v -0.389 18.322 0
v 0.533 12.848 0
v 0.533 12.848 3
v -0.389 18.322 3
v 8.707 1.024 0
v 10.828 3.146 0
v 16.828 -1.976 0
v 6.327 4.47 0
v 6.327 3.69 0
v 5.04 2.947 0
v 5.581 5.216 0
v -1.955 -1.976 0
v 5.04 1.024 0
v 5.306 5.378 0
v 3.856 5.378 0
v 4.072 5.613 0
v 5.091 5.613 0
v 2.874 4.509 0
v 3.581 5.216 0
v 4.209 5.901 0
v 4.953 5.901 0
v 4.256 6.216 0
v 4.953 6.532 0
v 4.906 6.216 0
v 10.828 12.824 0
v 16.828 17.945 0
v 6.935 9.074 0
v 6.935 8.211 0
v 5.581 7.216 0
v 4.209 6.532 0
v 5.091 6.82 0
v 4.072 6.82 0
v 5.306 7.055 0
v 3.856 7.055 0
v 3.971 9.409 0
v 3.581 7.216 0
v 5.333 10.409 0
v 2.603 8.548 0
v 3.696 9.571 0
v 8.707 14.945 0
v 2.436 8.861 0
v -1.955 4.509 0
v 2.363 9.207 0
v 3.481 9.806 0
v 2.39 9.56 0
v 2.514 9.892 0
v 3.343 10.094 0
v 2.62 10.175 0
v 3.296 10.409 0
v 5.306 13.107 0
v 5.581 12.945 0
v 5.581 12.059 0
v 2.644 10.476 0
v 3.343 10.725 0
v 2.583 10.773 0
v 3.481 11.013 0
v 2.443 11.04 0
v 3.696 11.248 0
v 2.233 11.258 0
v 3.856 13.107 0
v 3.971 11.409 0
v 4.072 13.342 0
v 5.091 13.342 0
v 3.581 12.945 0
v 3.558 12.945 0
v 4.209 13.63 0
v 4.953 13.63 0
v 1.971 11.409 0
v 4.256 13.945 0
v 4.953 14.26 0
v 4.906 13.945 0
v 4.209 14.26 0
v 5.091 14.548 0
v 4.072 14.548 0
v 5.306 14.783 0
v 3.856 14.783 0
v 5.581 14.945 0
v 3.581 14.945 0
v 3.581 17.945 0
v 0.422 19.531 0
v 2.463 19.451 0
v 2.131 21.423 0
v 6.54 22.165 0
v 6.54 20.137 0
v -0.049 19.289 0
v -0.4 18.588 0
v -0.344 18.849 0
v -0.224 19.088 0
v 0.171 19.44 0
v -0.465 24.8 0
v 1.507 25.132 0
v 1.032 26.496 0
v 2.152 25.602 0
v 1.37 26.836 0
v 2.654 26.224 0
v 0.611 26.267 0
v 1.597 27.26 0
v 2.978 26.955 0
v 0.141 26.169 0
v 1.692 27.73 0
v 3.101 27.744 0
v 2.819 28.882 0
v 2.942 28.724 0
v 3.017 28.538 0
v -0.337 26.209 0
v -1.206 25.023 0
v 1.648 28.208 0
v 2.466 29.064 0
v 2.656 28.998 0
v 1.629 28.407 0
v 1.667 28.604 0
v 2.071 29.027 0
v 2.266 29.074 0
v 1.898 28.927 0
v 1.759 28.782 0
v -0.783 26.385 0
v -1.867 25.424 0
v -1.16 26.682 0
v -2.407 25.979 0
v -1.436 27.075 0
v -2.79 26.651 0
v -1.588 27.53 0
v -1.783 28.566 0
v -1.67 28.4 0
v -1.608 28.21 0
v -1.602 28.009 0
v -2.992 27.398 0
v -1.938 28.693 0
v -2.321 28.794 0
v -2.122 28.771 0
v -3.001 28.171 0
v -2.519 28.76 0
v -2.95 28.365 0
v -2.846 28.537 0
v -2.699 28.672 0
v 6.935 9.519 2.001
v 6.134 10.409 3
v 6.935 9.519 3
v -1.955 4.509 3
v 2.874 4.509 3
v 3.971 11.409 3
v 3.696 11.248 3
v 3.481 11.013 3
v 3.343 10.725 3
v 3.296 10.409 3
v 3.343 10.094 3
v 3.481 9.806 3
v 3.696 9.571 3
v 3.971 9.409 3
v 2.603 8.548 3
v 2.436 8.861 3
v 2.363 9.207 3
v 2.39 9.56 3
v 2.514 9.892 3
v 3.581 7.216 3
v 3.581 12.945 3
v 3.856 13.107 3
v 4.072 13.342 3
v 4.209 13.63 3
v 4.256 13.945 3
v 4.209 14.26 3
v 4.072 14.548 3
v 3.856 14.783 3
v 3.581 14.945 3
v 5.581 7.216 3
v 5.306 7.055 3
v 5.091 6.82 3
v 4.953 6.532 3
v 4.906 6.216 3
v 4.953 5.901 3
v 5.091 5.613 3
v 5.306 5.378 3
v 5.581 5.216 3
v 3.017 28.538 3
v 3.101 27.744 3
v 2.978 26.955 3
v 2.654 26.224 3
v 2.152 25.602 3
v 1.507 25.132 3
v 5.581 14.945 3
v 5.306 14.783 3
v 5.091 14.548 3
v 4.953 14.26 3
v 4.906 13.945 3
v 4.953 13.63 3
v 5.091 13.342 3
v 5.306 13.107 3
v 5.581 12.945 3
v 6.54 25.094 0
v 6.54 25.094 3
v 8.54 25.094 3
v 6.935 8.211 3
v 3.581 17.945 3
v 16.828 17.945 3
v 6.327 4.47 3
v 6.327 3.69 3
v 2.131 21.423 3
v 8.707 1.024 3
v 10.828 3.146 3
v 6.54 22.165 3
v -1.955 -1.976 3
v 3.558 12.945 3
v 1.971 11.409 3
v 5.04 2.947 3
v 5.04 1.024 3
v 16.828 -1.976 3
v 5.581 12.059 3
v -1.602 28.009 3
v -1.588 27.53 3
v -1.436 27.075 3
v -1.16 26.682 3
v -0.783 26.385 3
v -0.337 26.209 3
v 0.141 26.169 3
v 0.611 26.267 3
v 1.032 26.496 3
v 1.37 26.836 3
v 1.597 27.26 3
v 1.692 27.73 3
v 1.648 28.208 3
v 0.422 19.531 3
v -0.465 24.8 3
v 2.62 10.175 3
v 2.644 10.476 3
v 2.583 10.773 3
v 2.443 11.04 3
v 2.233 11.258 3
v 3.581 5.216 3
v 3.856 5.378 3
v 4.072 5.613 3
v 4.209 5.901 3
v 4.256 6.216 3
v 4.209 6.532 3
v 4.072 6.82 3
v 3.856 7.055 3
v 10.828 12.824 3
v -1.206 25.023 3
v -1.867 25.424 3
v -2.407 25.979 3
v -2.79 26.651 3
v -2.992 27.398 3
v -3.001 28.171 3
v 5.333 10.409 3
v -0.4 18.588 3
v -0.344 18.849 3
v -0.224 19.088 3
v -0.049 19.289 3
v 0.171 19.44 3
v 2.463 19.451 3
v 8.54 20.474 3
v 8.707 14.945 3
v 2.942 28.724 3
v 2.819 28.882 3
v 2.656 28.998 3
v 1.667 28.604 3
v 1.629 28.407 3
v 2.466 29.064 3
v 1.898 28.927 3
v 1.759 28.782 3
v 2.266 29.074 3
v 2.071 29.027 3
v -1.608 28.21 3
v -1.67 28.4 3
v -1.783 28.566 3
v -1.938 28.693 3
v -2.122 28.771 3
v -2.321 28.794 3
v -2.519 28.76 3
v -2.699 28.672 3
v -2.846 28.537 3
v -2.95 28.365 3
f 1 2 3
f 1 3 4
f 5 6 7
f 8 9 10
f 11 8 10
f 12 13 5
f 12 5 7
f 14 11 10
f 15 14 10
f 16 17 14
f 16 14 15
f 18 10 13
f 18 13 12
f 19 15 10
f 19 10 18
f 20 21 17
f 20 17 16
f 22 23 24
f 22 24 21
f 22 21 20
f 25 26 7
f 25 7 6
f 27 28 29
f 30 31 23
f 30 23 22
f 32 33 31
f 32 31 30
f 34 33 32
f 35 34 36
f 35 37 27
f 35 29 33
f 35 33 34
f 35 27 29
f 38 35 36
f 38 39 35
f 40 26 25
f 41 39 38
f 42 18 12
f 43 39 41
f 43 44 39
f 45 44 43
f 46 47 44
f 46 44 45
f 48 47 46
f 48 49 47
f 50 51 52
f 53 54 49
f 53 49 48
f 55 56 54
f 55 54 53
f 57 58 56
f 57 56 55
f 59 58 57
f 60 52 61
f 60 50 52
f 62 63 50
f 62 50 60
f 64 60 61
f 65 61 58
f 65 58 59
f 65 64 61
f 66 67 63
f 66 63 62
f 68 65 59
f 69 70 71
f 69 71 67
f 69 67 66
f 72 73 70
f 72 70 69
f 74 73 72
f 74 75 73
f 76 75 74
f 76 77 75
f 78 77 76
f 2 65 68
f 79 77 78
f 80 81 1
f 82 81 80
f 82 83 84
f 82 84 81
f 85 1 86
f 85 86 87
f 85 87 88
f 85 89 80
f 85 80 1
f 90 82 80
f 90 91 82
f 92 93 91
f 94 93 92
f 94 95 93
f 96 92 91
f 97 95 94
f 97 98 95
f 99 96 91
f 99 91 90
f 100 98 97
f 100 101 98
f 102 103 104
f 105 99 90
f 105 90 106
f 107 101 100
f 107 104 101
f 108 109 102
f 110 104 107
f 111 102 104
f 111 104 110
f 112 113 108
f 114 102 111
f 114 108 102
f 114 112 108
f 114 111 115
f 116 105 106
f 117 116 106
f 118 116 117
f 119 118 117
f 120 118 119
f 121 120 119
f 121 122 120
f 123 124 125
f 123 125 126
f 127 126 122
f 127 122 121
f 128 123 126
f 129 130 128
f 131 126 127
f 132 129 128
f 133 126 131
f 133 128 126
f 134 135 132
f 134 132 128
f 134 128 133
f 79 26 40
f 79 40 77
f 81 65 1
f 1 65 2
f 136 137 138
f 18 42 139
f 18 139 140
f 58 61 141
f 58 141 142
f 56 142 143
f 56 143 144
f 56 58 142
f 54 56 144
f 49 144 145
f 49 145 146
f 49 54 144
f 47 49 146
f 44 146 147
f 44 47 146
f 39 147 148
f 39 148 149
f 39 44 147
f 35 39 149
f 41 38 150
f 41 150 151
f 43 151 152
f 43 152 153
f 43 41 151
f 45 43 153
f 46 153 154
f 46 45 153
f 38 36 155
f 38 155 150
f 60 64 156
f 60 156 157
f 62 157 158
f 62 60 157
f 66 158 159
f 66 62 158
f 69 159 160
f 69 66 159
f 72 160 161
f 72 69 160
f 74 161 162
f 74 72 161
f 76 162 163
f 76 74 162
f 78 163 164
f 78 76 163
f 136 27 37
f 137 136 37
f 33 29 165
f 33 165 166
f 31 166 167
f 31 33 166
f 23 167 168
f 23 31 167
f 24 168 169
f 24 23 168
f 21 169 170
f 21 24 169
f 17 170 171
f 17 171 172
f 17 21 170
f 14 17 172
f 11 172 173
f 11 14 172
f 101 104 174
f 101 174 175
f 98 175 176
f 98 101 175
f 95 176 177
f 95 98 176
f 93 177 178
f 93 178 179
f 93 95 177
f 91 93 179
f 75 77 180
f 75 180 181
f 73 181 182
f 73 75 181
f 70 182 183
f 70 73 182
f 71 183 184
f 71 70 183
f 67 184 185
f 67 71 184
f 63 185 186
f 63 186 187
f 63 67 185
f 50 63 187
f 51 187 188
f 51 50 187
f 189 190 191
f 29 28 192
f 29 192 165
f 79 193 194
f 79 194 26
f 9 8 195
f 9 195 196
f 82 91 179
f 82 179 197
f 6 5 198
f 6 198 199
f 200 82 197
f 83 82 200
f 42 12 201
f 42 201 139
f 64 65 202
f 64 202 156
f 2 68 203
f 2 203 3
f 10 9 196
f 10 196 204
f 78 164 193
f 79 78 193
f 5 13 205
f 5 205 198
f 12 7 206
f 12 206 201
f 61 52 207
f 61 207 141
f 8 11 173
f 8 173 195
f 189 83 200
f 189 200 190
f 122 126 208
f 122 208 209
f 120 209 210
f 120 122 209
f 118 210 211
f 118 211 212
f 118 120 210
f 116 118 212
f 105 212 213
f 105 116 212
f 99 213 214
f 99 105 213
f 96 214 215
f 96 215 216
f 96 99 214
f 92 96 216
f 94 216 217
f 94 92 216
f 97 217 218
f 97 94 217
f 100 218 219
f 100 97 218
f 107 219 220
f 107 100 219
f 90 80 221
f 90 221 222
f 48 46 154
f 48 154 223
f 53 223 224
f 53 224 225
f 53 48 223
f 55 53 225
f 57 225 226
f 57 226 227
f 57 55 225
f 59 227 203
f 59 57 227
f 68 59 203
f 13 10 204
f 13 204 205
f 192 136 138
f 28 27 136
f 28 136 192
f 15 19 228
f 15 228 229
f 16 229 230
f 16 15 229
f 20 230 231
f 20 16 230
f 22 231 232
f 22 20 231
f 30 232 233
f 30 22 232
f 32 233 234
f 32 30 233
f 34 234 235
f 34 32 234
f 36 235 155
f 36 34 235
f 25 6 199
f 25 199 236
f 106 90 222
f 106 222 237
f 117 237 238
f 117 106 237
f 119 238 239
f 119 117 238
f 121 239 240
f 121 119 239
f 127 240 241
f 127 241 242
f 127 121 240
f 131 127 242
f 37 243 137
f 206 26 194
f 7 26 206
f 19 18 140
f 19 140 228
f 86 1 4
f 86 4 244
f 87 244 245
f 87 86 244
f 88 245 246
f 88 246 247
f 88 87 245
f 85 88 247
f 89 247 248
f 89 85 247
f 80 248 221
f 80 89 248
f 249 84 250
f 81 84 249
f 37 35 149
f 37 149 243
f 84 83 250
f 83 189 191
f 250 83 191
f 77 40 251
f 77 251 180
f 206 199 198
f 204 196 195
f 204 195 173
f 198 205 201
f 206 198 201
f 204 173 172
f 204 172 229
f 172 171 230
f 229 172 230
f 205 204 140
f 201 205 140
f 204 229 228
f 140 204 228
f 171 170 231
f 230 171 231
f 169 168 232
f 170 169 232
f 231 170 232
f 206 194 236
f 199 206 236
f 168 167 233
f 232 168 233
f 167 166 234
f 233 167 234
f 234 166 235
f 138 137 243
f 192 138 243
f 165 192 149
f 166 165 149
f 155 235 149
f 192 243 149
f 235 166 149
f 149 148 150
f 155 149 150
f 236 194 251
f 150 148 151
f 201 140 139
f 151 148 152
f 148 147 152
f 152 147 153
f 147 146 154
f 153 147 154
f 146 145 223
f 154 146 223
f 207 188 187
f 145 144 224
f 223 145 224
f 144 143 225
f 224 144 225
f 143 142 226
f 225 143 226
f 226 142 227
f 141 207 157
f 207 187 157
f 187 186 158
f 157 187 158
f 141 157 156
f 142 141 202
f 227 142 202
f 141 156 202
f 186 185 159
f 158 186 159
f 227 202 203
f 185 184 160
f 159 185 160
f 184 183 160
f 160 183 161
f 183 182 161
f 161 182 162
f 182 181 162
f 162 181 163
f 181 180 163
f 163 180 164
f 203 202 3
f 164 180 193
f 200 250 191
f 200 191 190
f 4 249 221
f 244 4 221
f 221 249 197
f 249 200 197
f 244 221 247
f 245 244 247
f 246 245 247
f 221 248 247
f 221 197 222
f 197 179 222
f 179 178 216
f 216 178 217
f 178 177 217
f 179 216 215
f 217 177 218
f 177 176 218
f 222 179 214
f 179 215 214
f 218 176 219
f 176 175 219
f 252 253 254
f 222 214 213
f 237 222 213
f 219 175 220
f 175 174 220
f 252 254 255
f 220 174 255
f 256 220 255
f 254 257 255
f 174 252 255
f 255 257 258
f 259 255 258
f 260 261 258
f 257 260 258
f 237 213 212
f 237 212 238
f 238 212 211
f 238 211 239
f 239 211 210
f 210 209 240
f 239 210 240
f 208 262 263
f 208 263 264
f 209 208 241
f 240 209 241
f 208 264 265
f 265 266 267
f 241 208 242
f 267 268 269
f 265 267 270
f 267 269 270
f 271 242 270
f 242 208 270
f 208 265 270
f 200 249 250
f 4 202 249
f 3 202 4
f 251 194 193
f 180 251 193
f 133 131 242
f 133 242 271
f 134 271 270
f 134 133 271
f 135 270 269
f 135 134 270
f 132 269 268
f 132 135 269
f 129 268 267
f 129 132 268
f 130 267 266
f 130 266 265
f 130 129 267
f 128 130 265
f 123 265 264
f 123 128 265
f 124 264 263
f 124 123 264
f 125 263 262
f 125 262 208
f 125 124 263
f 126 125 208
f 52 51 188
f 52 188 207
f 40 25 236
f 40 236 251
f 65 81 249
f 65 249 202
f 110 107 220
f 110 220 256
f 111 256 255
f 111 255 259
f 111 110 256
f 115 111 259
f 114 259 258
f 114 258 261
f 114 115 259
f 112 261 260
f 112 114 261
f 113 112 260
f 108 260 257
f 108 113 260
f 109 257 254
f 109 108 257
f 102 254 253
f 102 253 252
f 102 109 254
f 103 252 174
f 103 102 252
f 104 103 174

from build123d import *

# Parameters (mm, degrees)
BOSS_SWITCHMAIN_DEPTH           = 3
SKETCH1_W                       = 6.582729781
SKETCH1_H                       = 1.5
SKETCH1_W_2                     = 4.49100728
BOSS_FLANGE_WIDTH_DEPTH         = 6
SKETCH2_W                       = 5
SKETCH2_H                       = 1.490135464
SKETCH2_H_2                     = 1.5
SKETCH2_H_3                     = 2.286069733
BOSS_FLANGE_HEIGHT_DEPTH        = 11.6675
TAP_DRILL_FOR_M2X0_4_TAP1_D     = 1.6
M2_CLEARANCE_HOLE2_D            = 2.4
M2_CLEARANCE_HOLE2_DEPTH        = 6.484923868
M2_CLEARANCE_HOLE2_TIP          = 0.721032743
CUT_FLANGE_RAMP_CLEARANCE_REACH = 21.921
SKETCH10_W                      = 1.51157113
SKETCH10_H                      = 3
CUT_EXTRUDE1_REACH              = 29.069
CUT_EXTRUDE2_REACH              = 24.401
SKETCH14_W                      = 3.00210875
SKETCH14_H                      = 3.681985306
SKETCH15_W                      = 18.424052467
SKETCH15_H                      = 20.375612782
CUT_EXTRUDE3_DEPTH              = 7


with BuildPart() as part:
    # Sketch-SwitchBossUp → Boss-SwitchMain (new body)
    with BuildSketch(Plane.XY):
        with BuildLine():
            Line((6.540476927, 22.165014537), (6.540476927, 25.093856925))
            Line((6.540476927, 25.093856925), (8.540476927, 25.093856925))
            Line((8.540476927, 25.093856925), (8.540476927, 20.473554675))
            Line((8.540476927, 20.473554675), (2.463355023, 19.450530066))
            Line((2.463355023, 19.450530066), (3.558499615, 12.944990388))
            Line((3.558499615, 12.944990388), (3.581088316, 12.944953207))
            ThreePointArc((3.581088316, 12.944953207), (4.256080915, 13.944958203), (3.581073513, 14.944953207))
            Line((3.581073513, 14.944953207), (3.581073513, 17.94496801))
            Line((3.581073513, 17.94496801), (6.811292922, 17.94496801))
            Line((6.811292922, 17.94496801), (16.828083018, 17.94496801))
            Line((16.828083018, 17.94496801), (16.828083018, -1.975613284))
            Line((16.828083018, -1.975613284), (5.040476927, -1.975613284))
            Line((5.040476927, -1.975613284), (-1.954752854, -1.975613284))
            Line((-1.954752854, -1.975613284), (-1.954752854, 4.509310584))
            Line((-1.954752854, 4.509310584), (2.874043973, 4.509310584))
            Line((2.874043973, 4.509310584), (3.58114552, 5.216422599))
            ThreePointArc((3.58114552, 5.216422599), (4.256138119, 6.216427595), (3.581130717, 7.216422599))
            Line((3.581130717, 7.216422599), (2.603418204, 8.548280984))
            ThreePointArc((2.603418204, 8.548280984), (2.363042898, 9.20714873), (2.514052348, 9.892045174))
            ThreePointArc((2.514052348, 9.892045174), (2.58326881, 10.772563057), (1.97126394, 11.409393254))
            Line((1.97126394, 11.409393254), (0.5326123, 12.848023597))
            Line((0.5326123, 12.848023597), (-0.388805291, 18.321564484))
            ThreePointArc((-0.388805291, 18.321564484), (-0.224136417, 19.087558912), (0.421628056, 19.531238467))
            Line((0.421628056, 19.531238467), (-0.465233701, 24.799505683))
            ThreePointArc((-0.465233701, 24.799505683), (-2.406587703, 25.978955839), (-3.001107523, 28.171329943))
            ThreePointArc((-3.001107523, 28.171329943), (-2.220760115, 28.789797628), (-1.602292431, 28.009450221))
            ThreePointArc((-1.602292431, 28.009450221), (0.141134159, 26.168671513), (1.647974165, 28.207650602))
            ThreePointArc((1.647974165, 28.207650602), (2.167041147, 29.057364566), (3.016755111, 28.538297585))
            ThreePointArc((3.016755111, 28.538297585), (2.839798095, 26.578800421), (1.507016259, 25.131514861))
            Line((1.507016259, 25.131514861), (2.131345845, 21.422780026))
            Line((2.131345845, 21.422780026), (6.540476927, 22.165014537))
        make_face()
        with BuildLine():
            Line((5.581088316, 12.94496801), (5.581094877, 12.05857133))
            Line((5.581094877, 12.05857133), (3.97126394, 11.409408058))
            ThreePointArc((3.97126394, 11.409408058), (3.296271341, 10.409403061), (3.971278743, 9.409408058))
            Line((3.971278743, 9.409408058), (5.332971639, 10.409021979))
            Line((5.332971639, 10.409021979), (6.133921896, 10.409027907))
            Line((6.133921896, 10.409027907), (6.935397893, 9.518898634))
            Line((6.935397893, 9.518898634), (6.935397893, 8.210600129))
            Line((6.935397893, 8.210600129), (5.581130717, 7.216437402))
            ThreePointArc((5.581130717, 7.216437402), (4.906138119, 6.216432406), (5.58114552, 5.216437402))
            Line((5.58114552, 5.216437402), (6.327120808, 4.470473157))
            Line((6.327120808, 4.470473157), (6.327120808, 3.690267188))
            Line((6.327120808, 3.690267188), (5.040476927, 2.947422997))
            Line((5.040476927, 2.947422997), (5.040476927, 1.024386716))
            Line((5.040476927, 1.024386716), (8.706762674, 1.024386716))
            Line((8.706762674, 1.024386716), (10.828083018, 3.145707059))
            Line((10.828083018, 3.145707059), (10.828083018, 12.823647666))
            Line((10.828083018, 12.823647666), (8.706762674, 14.94496801))
            Line((8.706762674, 14.94496801), (6.811292922, 14.94496801))
            Line((6.811292922, 14.94496801), (5.581073513, 14.94496801))
            ThreePointArc((5.581073513, 14.94496801), (4.906080915, 13.944963014), (5.581088316, 12.94496801))
        make_face(mode=Mode.SUBTRACT)
    extrude(amount=BOSS_SWITCHMAIN_DEPTH)

    # Sketch1 → Boss-Flange Width (add)
    with BuildSketch(Plane(origin=(0, 0, 0), x_dir=(-1, 0, 0), z_dir=(0, 0, -1))):
        with Locations((-1.336612037, -0.439543551)):
            Rectangle(SKETCH1_W, SKETCH1_H)
        Polygon((-3.581073513, 17.94496801), (-6.639548057, 17.94496801), (-6.811292922, 16.454832546), (-3.581073513, 16.454832546), align=None)
        with Locations((-0.290750786, 3.759310584)):
            Rectangle(SKETCH1_W_2, SKETCH1_H)
    extrude(amount=BOSS_FLANGE_WIDTH_DEPTH)

    # Sketch2 → Boss-Flange Height (add)
    with BuildSketch(Plane(origin=(-7.039523073, 0, 0), x_dir=(0, 0, -1), z_dir=(1, 0, 0))):
        with Locations((3.5, 17.199900278)):
            Rectangle(SKETCH2_W, SKETCH2_H)
        with Locations((3.5, 3.759310584)):
            Rectangle(SKETCH2_W, SKETCH2_H_2)
        with Locations((3.5, -0.832578417)):
            Rectangle(SKETCH2_W, SKETCH2_H_3)
    extrude(amount=BOSS_FLANGE_HEIGHT_DEPTH)

    # Tap Drill for M2x0.4 Tap1 (through all)
    with Locations(Plane(origin=(0, -1.975613284, 0), x_dir=(-1, 0, 0), z_dir=(0, -1, 0))):
        with Locations((4.039523073, 3.5), (-1.627976927, 3.5)):
            Hole(TAP_DRILL_FOR_M2X0_4_TAP1_D / 2)

    # M2 Clearance Hole2
    with Locations(Plane.XZ.offset(1.975613284)):
        with Locations((-4.039523073, -3.5), (1.627976927, -3.5)):
            Hole(M2_CLEARANCE_HOLE2_D / 2, depth=M2_CLEARANCE_HOLE2_DEPTH)
            with Locations((0, 0, -(M2_CLEARANCE_HOLE2_DEPTH + M2_CLEARANCE_HOLE2_TIP / 2))):  # 118° drill point
                Cone(0, M2_CLEARANCE_HOLE2_D / 2, M2_CLEARANCE_HOLE2_TIP, mode=Mode.SUBTRACT)

    # Sketch10 → Cut-Flange Ramp Clearance (cut, up to next)
    with BuildSketch(Plane(origin=(0, 17.94496801, 0), x_dir=(1, 0, 0), z_dir=(0, 1, 0)), mode=Mode.PRIVATE) as cut_flange_ramp_clearance_sk1:
        with Locations((5.883762492, 4.5)):
            Rectangle(SKETCH10_W, SKETCH10_H)
    cut_flange_ramp_clearance_tool1 = extrude(cut_flange_ramp_clearance_sk1.sketch, amount=-CUT_FLANGE_RAMP_CLEARANCE_REACH, mode=Mode.PRIVATE) & part.part
    add(cut_flange_ramp_clearance_tool1.solids().sort_by_distance((5.883762, 17.944968, -4.5))[0], mode=Mode.SUBTRACT)

    # Sketch12 → Cut-Extrude1 (cut, up to next)
    with BuildSketch(Plane(origin=(0, 25.093856925, 0), x_dir=(1, 0, 0), z_dir=(0, 1, 0)), mode=Mode.PRIVATE) as cut_extrude1_sk1:
        Polygon((6.540476927, 0), (8.540476927, -3), (8.540476927, 0), align=None)
    cut_extrude1_tool1 = extrude(cut_extrude1_sk1.sketch, amount=-CUT_EXTRUDE1_REACH, mode=Mode.PRIVATE) & part.part
    add(cut_extrude1_tool1.solids().sort_by_distance((7.87381, 25.093857, 1))[0], mode=Mode.SUBTRACT)

    # Sketch14 → Cut-Extrude2 (cut, up to next)
    with BuildSketch(Plane(origin=(7.097281825, 8.517301779, -1.894873399), x_dir=(-0.775775184, 0.615950427, -0.137032608), z_dir=(-0.631009401, -0.757261389, 0.168470544)), mode=Mode.PRIVATE) as cut_extrude2_sk1:
        with Locations((1.064245886, -3.532126158)):
            Rectangle(SKETCH14_W, SKETCH14_H)
    cut_extrude2_tool1 = extrude(cut_extrude2_sk1.sketch, amount=-CUT_EXTRUDE2_REACH, mode=Mode.PRIVATE) & part.part
    add(cut_extrude2_tool1.solids().sort_by_distance((6.271666, 9.939876, 1.407123))[0], mode=Mode.SUBTRACT)

    # Sketch15 → Cut-Extrude3 (cut, through all)
    with BuildSketch(Plane(origin=(0, 0, 0), x_dir=(-1, 0, 0), z_dir=(0, 0, -1))):
        with Locations((-0.841389079, 8.027902003)):
            Rectangle(SKETCH15_W, SKETCH15_H)
    extrude(amount=CUT_EXTRUDE3_DEPTH, mode=Mode.SUBTRACT)


solid = part.part
